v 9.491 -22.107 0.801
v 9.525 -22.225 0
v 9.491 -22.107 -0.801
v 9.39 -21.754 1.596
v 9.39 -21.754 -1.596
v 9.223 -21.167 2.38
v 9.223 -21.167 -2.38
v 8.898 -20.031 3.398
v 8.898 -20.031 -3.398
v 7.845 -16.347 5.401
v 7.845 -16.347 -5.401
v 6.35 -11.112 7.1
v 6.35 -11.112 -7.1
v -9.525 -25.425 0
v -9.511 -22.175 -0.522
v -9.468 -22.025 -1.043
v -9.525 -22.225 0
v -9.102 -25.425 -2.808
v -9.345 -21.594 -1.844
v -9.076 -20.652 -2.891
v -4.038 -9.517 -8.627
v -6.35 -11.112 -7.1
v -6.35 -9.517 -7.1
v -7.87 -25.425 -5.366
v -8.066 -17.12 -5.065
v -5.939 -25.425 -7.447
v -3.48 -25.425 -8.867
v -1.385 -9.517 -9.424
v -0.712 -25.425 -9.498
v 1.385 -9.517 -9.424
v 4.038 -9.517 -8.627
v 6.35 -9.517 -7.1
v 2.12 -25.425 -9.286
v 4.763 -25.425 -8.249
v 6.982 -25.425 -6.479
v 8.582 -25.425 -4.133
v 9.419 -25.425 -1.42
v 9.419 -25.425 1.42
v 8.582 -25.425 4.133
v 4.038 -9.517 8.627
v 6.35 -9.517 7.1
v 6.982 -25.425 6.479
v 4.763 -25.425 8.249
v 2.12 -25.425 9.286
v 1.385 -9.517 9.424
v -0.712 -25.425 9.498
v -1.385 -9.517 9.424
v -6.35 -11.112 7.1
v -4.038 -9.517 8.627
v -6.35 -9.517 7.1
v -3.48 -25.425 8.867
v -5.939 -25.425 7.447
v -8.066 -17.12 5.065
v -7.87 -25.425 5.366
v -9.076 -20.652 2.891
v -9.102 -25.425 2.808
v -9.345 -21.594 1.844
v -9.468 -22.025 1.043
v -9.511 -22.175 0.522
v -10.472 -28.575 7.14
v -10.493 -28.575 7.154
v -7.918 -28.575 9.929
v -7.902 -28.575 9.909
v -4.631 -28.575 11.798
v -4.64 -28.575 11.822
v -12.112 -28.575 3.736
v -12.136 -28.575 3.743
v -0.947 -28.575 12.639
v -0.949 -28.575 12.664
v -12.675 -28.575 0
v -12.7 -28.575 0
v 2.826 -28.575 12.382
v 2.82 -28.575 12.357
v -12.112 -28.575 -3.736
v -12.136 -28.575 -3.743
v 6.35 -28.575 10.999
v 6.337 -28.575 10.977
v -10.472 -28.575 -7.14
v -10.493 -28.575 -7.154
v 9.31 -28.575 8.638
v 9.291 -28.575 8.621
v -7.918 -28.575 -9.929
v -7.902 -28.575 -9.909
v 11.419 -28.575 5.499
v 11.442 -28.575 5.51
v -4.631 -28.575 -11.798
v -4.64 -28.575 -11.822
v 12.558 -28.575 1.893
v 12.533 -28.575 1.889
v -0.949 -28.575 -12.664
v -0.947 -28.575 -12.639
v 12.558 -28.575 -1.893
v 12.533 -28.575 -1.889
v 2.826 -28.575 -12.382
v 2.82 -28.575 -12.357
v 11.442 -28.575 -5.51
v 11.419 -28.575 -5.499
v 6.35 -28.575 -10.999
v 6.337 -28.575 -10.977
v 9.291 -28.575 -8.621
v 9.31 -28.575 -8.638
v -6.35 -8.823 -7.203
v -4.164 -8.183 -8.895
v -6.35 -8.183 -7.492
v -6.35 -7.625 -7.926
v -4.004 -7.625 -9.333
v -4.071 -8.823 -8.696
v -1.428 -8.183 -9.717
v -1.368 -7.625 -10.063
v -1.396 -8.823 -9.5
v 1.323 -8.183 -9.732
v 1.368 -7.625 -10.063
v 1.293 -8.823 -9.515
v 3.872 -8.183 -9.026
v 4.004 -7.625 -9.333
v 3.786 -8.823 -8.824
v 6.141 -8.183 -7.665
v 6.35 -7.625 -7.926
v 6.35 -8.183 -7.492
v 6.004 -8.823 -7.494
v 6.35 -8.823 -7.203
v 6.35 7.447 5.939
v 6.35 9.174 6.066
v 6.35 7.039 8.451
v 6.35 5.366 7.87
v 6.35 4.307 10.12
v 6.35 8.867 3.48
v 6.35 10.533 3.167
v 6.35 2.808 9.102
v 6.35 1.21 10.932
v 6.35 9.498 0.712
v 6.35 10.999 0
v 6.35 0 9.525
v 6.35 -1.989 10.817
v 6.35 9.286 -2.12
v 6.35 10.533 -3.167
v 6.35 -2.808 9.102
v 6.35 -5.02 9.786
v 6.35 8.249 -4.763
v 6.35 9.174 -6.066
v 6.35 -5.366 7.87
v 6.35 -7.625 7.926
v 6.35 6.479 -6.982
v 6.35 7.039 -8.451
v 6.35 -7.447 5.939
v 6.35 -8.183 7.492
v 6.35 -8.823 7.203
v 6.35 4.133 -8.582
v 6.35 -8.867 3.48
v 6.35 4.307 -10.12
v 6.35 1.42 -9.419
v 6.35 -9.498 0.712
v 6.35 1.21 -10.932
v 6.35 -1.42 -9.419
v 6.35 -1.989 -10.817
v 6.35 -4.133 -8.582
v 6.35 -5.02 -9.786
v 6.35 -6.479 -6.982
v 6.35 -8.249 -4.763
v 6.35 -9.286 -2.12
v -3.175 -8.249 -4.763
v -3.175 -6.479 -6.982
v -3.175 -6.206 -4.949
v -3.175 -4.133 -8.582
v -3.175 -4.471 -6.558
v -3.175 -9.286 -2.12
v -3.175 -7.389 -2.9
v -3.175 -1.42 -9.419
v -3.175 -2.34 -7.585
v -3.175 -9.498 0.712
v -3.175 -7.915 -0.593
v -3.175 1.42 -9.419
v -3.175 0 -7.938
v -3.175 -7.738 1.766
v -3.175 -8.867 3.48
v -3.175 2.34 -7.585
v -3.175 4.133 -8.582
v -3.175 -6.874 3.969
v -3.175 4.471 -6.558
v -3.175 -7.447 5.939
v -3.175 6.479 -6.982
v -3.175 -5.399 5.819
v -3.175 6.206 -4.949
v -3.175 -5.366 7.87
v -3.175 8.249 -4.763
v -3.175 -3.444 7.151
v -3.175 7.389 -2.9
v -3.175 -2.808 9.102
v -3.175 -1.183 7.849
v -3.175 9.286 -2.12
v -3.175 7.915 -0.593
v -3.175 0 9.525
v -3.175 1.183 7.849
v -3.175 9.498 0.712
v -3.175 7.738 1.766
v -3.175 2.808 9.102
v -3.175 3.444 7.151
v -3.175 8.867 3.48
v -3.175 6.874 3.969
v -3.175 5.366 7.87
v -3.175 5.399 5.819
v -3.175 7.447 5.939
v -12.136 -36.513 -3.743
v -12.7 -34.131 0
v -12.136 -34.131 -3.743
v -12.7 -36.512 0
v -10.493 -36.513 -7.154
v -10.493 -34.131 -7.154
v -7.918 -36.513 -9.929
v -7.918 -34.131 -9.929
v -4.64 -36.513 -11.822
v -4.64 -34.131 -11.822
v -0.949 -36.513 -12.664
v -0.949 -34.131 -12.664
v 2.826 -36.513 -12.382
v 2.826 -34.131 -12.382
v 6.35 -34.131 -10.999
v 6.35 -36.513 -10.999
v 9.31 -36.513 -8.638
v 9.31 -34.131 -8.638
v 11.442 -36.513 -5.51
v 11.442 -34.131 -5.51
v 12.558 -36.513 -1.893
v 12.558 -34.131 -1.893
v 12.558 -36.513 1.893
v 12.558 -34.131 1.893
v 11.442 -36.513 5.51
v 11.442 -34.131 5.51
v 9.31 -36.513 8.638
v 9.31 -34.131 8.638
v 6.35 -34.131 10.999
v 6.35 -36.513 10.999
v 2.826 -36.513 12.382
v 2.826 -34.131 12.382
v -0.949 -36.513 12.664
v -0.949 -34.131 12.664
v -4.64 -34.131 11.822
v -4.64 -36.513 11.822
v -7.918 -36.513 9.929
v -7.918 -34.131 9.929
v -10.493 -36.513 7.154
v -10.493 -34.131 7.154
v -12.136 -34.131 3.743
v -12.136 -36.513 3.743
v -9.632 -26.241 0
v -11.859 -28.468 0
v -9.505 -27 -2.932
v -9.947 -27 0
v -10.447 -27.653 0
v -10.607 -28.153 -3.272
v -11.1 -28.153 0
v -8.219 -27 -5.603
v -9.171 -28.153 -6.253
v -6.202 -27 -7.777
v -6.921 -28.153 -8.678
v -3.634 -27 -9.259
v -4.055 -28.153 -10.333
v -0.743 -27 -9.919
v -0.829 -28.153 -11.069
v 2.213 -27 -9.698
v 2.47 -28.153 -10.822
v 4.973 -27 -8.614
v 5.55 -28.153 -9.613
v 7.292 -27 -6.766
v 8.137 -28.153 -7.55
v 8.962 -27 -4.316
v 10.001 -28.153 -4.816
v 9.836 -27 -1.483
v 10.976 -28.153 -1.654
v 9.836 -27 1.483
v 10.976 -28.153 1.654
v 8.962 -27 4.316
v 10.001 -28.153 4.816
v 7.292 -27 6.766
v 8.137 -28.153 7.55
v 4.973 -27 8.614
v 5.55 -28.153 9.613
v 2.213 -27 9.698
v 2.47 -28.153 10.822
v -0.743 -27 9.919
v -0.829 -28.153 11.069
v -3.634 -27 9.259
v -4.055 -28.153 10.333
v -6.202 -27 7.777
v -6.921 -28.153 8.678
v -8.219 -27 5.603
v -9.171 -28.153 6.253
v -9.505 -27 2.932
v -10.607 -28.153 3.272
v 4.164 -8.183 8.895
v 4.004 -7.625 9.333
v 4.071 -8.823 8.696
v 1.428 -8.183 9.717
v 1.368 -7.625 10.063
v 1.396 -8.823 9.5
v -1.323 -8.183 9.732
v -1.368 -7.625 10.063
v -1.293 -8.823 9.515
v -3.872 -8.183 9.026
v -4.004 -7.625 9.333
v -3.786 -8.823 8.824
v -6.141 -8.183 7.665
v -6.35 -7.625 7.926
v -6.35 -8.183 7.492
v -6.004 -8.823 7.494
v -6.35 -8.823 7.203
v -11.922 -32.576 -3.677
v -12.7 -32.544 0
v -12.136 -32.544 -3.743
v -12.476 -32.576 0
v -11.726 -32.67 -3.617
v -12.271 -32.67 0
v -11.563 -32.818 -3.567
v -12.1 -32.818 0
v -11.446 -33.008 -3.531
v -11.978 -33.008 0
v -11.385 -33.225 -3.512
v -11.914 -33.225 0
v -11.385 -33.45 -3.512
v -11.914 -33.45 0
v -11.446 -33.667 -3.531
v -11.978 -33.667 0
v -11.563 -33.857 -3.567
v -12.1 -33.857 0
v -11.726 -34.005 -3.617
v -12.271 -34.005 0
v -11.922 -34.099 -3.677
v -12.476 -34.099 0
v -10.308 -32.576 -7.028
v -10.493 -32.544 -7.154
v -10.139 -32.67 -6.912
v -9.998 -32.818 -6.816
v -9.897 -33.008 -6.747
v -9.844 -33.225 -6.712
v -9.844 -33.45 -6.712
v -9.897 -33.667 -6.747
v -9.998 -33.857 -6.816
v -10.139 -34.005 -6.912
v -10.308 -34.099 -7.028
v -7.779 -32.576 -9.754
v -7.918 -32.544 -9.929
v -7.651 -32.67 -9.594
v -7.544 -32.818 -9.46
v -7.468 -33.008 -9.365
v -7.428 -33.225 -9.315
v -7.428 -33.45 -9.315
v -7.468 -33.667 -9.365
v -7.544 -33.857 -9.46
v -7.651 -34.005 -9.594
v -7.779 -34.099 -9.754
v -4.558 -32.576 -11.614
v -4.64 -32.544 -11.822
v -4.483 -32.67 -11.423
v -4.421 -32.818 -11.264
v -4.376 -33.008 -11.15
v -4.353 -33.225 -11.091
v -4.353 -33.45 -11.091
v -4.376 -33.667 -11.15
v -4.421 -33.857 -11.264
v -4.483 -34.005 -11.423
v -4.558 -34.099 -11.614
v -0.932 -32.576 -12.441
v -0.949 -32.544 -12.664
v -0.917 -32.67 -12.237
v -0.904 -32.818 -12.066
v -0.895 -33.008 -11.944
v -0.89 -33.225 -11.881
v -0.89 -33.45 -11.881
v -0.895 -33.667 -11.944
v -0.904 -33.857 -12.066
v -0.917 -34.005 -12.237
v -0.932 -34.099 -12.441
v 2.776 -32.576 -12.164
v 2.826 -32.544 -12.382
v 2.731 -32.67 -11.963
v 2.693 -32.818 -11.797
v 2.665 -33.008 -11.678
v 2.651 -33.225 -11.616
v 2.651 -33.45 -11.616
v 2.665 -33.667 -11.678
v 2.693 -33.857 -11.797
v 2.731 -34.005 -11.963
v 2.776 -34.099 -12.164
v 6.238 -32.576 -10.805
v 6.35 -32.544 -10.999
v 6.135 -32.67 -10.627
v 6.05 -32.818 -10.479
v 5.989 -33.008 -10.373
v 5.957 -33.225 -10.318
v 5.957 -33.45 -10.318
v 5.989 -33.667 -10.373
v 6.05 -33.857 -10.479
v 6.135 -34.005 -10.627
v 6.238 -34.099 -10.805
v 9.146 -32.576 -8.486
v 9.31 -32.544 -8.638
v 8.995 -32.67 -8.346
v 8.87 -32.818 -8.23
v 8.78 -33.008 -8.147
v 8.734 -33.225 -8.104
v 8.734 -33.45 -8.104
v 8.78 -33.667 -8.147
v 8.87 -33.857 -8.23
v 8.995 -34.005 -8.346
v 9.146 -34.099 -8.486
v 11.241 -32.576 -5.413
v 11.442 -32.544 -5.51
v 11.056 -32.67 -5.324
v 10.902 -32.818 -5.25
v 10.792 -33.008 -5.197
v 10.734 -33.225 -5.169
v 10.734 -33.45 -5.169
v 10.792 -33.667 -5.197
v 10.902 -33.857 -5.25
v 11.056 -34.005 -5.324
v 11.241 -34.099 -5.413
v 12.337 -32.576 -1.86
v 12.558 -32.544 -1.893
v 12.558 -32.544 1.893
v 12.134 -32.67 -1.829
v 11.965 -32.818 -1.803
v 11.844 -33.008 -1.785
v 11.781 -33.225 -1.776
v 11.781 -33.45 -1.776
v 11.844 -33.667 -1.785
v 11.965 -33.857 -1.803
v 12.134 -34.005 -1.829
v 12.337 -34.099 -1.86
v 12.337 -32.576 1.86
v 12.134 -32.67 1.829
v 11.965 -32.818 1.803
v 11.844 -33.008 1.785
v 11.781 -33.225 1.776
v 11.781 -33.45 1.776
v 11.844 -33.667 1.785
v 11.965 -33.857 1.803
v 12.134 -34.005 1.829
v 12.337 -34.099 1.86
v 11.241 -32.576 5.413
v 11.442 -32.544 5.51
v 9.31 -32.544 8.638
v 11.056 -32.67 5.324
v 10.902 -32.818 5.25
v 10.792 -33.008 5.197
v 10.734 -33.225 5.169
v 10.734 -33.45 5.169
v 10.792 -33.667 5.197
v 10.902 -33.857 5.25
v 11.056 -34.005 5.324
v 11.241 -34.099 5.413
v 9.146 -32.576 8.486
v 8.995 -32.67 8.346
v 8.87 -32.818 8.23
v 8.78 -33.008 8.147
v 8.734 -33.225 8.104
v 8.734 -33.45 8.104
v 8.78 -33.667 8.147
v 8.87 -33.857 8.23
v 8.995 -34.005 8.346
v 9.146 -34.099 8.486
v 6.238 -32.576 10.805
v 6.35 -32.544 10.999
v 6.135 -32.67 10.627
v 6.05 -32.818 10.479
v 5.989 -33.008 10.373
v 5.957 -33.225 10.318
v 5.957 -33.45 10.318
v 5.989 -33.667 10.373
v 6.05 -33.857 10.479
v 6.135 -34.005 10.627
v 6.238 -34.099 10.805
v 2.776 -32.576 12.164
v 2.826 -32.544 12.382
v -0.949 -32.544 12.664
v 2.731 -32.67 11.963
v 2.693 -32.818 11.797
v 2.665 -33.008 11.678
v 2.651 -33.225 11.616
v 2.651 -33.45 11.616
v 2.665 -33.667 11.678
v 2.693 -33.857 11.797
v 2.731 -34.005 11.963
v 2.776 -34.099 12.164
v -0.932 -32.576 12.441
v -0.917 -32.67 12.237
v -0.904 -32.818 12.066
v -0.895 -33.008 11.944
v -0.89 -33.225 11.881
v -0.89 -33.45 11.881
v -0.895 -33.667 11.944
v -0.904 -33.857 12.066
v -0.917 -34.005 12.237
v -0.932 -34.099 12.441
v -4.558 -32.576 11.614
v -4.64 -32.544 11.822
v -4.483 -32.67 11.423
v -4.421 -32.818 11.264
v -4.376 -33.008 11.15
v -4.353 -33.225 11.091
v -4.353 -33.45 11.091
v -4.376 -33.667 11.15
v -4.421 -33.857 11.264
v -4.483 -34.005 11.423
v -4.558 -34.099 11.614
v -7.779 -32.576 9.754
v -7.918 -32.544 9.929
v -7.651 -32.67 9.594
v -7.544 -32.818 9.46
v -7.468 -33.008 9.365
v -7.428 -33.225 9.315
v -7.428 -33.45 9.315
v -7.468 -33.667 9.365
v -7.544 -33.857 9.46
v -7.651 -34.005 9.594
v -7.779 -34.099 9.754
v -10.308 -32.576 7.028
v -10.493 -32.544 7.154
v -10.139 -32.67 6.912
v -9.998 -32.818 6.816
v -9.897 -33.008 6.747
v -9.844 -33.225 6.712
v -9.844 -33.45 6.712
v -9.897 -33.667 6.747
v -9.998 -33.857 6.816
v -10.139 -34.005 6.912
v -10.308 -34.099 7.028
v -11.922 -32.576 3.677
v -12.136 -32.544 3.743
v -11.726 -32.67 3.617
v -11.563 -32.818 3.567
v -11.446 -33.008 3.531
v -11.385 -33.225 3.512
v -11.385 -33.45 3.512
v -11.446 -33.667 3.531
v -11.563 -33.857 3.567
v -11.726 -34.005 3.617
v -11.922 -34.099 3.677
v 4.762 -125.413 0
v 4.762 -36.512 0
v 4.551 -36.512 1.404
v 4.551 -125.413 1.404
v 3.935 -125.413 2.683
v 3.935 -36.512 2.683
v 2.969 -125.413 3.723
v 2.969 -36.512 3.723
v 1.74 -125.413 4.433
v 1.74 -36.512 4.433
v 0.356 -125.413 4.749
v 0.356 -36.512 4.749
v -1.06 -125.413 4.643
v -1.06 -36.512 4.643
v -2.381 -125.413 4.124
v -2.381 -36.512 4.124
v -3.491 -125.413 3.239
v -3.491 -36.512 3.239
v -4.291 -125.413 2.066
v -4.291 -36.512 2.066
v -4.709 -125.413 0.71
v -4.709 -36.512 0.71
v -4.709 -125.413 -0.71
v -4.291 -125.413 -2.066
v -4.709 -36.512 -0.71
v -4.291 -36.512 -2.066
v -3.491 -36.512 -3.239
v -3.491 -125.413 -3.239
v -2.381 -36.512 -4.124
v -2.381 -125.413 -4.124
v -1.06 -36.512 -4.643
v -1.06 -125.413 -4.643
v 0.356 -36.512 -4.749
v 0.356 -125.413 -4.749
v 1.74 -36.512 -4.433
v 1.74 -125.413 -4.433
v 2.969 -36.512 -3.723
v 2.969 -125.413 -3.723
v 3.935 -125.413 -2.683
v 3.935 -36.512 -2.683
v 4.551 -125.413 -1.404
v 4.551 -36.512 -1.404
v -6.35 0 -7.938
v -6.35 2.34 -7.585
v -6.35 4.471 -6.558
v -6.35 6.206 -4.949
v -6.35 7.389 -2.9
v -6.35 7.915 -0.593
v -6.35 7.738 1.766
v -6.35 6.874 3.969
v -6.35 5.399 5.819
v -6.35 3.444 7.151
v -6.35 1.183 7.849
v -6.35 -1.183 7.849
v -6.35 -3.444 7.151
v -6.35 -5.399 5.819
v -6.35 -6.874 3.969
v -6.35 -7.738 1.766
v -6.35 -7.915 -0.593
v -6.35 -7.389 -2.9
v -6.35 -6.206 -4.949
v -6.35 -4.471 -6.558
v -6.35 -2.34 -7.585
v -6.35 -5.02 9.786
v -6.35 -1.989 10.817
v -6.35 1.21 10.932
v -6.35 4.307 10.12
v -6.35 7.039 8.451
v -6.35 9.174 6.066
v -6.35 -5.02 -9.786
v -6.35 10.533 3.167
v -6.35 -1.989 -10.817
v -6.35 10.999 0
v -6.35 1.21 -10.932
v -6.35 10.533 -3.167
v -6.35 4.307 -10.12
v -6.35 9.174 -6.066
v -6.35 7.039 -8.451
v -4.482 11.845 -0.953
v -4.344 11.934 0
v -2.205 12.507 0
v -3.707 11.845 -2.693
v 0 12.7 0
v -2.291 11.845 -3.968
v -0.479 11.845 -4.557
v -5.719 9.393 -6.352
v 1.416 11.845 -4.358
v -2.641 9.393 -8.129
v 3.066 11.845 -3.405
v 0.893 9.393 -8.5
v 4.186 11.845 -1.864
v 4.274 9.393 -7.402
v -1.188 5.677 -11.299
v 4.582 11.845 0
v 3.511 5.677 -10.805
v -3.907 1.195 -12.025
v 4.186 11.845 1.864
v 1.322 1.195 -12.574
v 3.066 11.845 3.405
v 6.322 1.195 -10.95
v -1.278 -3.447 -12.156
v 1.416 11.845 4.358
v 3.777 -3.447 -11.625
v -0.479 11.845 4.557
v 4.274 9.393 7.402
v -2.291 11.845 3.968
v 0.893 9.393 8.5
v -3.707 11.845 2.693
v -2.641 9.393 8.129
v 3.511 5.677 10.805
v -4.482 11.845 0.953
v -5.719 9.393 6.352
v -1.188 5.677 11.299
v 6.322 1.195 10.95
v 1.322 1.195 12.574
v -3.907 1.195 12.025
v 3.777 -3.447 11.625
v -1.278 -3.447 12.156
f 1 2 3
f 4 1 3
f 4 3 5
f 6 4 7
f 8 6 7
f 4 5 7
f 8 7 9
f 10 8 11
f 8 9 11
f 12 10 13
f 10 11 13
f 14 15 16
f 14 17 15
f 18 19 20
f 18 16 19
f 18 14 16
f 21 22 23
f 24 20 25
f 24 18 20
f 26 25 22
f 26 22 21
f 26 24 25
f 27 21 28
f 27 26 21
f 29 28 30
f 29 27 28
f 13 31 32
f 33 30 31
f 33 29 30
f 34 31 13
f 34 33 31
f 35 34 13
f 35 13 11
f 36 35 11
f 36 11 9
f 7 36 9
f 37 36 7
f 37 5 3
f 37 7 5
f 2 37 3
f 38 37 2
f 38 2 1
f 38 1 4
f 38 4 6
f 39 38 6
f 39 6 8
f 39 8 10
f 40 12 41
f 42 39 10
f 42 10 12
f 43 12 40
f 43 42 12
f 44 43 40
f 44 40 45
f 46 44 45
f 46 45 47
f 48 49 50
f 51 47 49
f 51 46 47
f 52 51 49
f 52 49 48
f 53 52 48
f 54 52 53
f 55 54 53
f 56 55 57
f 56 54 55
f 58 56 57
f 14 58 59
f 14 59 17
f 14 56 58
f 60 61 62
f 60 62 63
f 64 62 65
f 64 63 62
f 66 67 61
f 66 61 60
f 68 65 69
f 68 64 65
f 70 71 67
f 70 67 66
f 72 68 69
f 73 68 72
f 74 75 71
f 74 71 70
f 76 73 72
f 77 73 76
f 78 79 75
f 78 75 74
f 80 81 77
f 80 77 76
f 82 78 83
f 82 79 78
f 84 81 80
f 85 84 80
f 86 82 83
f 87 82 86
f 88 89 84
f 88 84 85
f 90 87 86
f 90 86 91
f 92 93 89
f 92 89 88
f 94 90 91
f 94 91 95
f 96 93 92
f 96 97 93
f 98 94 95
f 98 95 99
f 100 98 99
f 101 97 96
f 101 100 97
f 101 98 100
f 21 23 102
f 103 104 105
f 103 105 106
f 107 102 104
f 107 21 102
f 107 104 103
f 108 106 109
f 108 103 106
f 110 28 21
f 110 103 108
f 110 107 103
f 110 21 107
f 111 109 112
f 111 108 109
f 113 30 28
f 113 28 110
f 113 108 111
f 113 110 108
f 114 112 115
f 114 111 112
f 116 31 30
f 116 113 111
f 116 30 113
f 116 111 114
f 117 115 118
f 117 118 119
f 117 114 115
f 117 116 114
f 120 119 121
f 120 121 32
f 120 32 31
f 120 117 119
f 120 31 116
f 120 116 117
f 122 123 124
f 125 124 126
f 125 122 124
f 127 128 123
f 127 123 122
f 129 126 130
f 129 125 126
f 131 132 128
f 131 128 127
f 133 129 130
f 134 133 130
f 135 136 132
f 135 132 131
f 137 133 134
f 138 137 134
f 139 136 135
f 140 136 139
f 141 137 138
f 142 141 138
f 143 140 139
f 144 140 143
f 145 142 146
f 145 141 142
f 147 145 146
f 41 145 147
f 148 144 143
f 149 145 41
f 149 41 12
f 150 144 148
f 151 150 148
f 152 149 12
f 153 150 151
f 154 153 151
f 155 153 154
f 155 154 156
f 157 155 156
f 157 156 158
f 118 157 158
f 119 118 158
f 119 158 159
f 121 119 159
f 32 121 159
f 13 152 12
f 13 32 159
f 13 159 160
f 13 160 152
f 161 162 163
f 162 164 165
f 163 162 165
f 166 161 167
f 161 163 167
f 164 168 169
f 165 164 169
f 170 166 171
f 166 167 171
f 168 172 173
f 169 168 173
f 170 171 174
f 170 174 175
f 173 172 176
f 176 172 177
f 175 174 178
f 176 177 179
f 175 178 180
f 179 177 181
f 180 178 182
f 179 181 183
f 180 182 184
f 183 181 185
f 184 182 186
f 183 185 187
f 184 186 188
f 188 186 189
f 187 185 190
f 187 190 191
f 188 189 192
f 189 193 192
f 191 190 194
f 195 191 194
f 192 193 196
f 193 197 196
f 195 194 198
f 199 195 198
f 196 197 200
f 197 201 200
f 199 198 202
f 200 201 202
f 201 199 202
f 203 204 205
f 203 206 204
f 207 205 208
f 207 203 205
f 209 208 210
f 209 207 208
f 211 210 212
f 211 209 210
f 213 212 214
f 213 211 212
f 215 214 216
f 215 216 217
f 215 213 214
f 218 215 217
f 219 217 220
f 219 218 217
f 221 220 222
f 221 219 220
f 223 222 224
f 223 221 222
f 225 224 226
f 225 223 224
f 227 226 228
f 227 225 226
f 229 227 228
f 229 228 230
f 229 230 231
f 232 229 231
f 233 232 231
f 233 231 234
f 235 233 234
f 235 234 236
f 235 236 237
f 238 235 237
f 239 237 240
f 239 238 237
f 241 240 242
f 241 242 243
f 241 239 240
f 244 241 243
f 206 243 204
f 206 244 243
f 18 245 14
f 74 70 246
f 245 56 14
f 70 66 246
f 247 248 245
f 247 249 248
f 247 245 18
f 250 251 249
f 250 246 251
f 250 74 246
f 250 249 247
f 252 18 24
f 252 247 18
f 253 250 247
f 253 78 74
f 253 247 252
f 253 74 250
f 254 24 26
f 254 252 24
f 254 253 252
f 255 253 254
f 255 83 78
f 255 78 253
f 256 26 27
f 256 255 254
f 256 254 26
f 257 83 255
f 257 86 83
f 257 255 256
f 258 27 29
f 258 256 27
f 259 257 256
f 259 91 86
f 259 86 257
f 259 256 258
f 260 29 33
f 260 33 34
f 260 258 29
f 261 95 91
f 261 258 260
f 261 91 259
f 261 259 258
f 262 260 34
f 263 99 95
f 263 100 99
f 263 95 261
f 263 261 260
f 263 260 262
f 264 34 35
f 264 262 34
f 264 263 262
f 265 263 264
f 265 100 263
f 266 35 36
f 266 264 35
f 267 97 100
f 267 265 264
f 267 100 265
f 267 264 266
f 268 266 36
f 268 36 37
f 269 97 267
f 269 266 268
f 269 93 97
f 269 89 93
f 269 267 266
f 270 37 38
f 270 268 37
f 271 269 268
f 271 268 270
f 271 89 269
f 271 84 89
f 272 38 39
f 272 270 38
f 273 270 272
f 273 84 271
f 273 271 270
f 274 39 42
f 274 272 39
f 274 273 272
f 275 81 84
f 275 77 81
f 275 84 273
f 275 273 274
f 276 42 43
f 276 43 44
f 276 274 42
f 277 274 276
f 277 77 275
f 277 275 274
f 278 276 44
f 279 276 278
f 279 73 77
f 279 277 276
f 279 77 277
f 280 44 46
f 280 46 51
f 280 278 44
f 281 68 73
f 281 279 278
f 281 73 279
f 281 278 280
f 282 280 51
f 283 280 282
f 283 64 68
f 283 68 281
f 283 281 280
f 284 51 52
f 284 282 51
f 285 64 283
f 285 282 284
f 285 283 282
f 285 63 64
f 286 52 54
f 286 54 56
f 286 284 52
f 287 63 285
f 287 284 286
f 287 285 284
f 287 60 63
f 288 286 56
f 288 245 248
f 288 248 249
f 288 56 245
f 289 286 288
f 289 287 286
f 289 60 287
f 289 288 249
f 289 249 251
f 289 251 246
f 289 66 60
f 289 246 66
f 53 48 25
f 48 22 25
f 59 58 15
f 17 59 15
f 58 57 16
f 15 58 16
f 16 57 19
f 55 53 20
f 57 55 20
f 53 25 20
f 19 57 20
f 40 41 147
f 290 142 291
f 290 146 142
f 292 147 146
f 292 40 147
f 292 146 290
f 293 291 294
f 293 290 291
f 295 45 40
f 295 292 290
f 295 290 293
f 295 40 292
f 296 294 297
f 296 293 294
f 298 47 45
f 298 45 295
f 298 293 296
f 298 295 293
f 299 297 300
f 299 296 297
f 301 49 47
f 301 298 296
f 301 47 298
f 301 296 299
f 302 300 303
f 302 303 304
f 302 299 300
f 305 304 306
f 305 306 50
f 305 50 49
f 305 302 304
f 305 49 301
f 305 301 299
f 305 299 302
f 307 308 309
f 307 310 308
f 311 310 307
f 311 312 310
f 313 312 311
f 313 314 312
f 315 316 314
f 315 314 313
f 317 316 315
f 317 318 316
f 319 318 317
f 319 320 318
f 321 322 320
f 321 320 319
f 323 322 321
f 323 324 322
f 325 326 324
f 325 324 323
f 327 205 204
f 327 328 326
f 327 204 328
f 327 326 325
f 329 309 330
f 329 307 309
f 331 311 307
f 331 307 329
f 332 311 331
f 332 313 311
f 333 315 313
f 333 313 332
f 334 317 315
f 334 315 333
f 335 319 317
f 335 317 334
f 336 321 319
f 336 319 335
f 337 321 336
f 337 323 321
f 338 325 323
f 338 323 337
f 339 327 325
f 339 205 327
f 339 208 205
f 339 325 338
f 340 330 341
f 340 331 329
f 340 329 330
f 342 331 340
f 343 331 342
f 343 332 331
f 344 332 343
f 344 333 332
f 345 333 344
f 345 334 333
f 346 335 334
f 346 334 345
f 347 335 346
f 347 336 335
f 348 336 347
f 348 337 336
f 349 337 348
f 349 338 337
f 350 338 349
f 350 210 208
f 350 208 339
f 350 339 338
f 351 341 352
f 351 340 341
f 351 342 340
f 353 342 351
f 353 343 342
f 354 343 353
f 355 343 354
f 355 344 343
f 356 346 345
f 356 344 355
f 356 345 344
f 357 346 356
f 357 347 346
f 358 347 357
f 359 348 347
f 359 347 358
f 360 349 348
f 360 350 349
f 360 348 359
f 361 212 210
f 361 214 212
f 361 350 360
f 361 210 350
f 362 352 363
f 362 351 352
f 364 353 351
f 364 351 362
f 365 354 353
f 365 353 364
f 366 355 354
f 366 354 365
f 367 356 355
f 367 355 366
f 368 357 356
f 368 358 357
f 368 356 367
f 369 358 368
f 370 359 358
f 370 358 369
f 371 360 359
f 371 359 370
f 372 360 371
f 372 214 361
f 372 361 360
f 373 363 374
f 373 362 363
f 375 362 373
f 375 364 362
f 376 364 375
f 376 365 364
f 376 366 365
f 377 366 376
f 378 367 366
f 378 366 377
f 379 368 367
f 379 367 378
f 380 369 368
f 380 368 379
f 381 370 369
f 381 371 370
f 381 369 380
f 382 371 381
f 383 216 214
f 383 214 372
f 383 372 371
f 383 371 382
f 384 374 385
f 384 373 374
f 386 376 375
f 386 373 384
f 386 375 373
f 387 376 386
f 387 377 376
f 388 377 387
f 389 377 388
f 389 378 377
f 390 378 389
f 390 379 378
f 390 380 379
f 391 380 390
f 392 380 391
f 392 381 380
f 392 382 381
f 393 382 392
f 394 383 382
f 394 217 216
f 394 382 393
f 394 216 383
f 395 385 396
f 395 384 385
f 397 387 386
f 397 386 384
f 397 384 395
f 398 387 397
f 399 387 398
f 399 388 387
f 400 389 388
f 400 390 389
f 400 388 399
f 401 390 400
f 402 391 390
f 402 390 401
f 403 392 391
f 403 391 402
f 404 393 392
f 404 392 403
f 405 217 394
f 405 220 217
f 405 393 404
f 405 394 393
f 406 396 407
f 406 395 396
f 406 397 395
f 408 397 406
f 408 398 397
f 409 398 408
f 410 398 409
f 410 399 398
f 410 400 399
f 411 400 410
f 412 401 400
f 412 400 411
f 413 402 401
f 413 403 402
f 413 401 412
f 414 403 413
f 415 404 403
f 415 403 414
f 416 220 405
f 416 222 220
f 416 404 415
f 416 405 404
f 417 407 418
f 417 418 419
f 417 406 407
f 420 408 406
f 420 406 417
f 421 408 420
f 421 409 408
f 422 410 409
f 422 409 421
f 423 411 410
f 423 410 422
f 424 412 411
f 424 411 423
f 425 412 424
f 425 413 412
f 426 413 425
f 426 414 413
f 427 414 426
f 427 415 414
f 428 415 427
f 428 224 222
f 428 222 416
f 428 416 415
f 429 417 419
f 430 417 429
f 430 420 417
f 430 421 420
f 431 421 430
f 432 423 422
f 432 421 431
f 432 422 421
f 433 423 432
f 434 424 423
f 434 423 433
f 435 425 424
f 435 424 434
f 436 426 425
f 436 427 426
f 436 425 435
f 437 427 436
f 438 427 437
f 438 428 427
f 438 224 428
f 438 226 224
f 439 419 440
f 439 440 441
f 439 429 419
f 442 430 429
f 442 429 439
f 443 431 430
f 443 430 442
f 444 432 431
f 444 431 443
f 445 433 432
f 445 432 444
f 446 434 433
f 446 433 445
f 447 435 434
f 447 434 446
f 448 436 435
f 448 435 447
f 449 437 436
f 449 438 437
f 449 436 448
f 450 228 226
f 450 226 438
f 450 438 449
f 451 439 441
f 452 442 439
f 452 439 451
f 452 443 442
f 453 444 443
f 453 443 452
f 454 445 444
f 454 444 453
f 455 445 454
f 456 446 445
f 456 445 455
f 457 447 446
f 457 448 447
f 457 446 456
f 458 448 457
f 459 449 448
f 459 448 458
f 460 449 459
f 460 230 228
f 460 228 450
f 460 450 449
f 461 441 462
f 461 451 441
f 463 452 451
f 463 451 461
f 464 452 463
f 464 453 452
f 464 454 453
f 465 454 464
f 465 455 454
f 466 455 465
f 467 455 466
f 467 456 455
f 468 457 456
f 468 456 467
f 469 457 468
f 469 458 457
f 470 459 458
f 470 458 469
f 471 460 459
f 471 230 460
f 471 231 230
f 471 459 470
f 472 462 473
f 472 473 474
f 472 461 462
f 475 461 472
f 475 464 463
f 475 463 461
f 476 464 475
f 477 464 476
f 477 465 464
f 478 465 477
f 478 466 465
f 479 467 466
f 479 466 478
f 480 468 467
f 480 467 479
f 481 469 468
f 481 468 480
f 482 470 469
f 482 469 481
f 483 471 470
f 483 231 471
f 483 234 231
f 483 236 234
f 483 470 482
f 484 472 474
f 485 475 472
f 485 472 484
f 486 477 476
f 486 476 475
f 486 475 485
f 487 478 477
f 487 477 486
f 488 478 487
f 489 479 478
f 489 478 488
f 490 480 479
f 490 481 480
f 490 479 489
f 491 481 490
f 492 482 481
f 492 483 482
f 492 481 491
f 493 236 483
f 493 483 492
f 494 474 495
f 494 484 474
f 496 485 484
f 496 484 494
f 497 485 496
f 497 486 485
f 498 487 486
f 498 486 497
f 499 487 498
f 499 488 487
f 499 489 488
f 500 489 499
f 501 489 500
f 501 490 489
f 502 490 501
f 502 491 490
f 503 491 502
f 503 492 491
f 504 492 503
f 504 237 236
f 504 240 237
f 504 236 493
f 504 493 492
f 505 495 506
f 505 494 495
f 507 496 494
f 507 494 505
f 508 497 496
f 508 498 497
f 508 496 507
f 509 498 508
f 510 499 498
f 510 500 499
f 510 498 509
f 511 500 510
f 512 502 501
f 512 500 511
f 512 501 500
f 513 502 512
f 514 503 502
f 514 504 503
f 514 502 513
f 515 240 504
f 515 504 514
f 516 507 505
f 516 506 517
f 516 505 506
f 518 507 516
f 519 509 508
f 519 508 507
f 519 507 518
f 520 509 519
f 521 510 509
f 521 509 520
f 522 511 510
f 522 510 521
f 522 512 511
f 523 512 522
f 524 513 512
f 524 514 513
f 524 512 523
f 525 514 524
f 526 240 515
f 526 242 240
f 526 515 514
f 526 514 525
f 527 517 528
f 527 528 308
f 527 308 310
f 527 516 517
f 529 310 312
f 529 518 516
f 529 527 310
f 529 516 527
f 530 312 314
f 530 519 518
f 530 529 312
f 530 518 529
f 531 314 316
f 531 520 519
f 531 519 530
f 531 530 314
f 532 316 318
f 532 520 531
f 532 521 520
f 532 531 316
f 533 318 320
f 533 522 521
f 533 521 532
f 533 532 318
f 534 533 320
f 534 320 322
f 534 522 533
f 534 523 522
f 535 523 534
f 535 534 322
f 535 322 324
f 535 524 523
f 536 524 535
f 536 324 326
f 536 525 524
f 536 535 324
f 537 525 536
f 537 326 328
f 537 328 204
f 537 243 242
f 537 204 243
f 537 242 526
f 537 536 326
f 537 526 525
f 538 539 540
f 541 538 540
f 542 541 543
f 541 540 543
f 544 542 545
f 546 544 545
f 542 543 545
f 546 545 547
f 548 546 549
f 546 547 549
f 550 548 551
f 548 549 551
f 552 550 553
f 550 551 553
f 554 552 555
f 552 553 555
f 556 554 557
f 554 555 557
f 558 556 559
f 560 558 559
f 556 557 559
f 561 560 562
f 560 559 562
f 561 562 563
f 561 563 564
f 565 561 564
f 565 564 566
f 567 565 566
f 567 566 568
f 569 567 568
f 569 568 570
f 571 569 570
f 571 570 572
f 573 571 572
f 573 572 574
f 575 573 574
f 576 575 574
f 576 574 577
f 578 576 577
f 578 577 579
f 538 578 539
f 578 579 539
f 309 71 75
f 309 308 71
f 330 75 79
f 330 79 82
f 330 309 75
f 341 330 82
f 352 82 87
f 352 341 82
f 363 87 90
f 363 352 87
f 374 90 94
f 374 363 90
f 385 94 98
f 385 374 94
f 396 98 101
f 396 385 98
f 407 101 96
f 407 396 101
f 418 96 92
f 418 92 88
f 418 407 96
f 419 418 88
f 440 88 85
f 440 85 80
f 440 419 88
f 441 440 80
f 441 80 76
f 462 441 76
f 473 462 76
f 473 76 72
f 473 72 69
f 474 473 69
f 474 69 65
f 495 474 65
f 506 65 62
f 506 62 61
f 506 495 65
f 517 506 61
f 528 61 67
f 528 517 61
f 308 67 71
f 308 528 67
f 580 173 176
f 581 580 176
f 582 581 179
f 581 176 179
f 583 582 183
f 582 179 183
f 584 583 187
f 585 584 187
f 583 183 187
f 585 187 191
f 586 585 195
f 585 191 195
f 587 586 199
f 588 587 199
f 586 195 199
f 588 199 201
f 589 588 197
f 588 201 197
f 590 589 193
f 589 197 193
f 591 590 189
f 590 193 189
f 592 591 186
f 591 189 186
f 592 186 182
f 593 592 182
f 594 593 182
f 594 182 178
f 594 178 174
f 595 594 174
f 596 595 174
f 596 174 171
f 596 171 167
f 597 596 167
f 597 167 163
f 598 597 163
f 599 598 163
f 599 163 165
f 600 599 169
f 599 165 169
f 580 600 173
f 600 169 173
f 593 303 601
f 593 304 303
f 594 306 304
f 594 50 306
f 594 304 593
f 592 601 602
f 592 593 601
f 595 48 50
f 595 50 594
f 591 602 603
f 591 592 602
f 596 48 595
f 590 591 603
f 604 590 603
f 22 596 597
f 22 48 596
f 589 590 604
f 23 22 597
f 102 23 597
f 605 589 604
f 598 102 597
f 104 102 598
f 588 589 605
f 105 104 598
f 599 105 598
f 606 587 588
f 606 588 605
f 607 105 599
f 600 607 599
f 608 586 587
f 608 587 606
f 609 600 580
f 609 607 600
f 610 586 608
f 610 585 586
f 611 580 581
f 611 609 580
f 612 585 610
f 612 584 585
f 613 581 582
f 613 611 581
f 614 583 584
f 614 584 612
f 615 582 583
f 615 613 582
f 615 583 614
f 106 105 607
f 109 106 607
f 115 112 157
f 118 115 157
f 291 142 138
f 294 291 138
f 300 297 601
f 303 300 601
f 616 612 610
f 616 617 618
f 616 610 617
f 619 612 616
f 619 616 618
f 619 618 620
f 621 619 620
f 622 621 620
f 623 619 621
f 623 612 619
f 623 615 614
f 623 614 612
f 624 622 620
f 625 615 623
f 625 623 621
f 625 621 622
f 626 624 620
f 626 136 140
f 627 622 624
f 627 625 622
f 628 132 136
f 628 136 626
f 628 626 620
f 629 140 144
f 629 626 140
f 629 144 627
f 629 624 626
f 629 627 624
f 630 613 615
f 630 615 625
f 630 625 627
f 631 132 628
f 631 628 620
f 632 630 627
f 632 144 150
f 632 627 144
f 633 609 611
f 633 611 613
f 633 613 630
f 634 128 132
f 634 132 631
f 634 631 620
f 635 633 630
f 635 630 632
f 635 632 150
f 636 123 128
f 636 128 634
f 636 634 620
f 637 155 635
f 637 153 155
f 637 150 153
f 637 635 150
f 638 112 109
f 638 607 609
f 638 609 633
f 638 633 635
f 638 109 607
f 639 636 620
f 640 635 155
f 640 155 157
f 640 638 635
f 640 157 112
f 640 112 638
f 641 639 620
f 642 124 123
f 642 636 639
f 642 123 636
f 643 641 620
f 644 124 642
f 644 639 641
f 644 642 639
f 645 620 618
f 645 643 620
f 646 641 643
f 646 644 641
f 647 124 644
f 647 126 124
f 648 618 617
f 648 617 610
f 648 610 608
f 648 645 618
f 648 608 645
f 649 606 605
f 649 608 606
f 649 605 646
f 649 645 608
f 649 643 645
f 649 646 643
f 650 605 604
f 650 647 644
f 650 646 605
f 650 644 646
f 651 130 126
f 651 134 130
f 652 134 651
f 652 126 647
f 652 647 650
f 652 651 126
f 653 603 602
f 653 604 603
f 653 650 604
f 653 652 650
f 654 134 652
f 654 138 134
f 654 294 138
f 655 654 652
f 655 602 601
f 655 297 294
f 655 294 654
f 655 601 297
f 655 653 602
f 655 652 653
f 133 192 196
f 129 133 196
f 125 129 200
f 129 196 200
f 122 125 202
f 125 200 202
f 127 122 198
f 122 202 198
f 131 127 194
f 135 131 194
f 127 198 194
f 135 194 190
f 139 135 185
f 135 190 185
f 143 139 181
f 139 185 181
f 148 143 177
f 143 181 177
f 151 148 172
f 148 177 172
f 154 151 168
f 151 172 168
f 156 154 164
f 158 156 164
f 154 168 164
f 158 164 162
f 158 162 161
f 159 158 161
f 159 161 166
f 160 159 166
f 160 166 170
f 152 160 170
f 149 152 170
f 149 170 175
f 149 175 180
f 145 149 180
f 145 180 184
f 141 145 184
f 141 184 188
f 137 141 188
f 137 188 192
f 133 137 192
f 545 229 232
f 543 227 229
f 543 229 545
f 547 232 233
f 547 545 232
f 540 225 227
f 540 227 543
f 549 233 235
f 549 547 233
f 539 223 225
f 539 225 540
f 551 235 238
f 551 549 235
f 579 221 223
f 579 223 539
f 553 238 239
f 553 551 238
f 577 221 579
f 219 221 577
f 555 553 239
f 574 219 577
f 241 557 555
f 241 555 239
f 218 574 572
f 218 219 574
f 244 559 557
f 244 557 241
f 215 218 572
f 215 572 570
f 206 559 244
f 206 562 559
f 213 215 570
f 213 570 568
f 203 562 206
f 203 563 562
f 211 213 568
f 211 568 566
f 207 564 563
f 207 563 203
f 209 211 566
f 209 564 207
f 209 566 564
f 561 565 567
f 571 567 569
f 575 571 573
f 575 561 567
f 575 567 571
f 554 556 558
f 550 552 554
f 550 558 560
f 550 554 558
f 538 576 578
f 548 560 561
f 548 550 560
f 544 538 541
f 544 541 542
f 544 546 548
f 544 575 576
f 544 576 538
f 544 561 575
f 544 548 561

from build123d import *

# Parameters (mm, degrees)
EXTRUDE1_DEPTH      = 13.7
EXTRUDE1_DEPTH_BACK = 13.7
SKETCH4_R           = 7.9375
EXTRUDE3_DEPTH      = 13.7
EXTRUDE3_DEPTH_BACK = 13.7
SKETCH5_R           = 9.525
EXTRUDE4_DEPTH      = 16.875
SKETCH6_R           = 4.7625
EXTRUDE5_DEPTH      = 88.9


with BuildPart() as part:
    # Sketch1 → Revolve1 (revolve)
    with BuildSketch(Plane.XY):
        with BuildLine():
            Line((-9.525, -9.516529567), (-9.525, -25.4254))
            ThreePointArc((-9.525, -25.4254), (-10.447496482, -27.652503518), (-12.6746, -28.575))
            Line((-12.6746, -28.575), (-12.7, -28.575))
            Line((-12.7, -28.575), (-12.7, -32.54375))
            ThreePointArc((-12.7, -32.54375), (-11.90625, -33.3375), (-12.7, -34.13125))
            Line((-12.7, -34.13125), (-12.7, -36.5125))
            Line((-12.7, -36.5125), (0, -36.5125))
            Line((0, -36.5125), (0, 12.7))
            ThreePointArc((0, 12.7), (-11.360741372, 5.676579559), (-10.155929487, -7.625424333))
            ThreePointArc((-10.155929487, -7.625424333), (-9.68689312, -8.519740845), (-9.525, -9.516529567))
        make_face()
    revolve(axis=Axis((0, 29.568581121, 0), (0, -1, 0)))

    # Sketch2 → Extrude1 (cut, two sides)
    with BuildSketch(Plane.XY) as extrude1_sk:
        Polygon((-6.35, 10.998522628), (-6.35, -11.1125), (-9.525, -22.225), (-17.461272298, -22.225), (-17.461272298, 15.422387348), (17.461272298, 15.422387348), (17.461272298, -22.225), (9.525, -22.225), (6.35, -11.1125), (6.35, 10.998522628), (6.35, 13.9933427), (-6.35, 13.9933427), align=None)
    extrude(amount=EXTRUDE1_DEPTH, mode=Mode.SUBTRACT)
    extrude(extrude1_sk.sketch, amount=-EXTRUDE1_DEPTH_BACK, mode=Mode.SUBTRACT)

    # Sketch4 → Extrude3 (cut, two sides)
    with BuildSketch(Plane(origin=(0, 0, 0), x_dir=(0, 0, -1), z_dir=(1, 0, 0))) as extrude3_sk:
        Circle(SKETCH4_R)
    extrude(amount=EXTRUDE3_DEPTH, mode=Mode.SUBTRACT)
    extrude(extrude3_sk.sketch, amount=-EXTRUDE3_DEPTH_BACK, mode=Mode.SUBTRACT)

    # Sketch5 → Extrude4 (cut, through all)
    with BuildSketch(Plane.ZY.offset(3.175)):
        Circle(SKETCH5_R)
    extrude(amount=-EXTRUDE4_DEPTH, mode=Mode.SUBTRACT)

    # Sketch6 → Extrude5 (add)
    with BuildSketch(Plane.XZ.offset(36.5125)):
        Circle(SKETCH6_R)
    extrude(amount=EXTRUDE5_DEPTH)


solid = part.part
